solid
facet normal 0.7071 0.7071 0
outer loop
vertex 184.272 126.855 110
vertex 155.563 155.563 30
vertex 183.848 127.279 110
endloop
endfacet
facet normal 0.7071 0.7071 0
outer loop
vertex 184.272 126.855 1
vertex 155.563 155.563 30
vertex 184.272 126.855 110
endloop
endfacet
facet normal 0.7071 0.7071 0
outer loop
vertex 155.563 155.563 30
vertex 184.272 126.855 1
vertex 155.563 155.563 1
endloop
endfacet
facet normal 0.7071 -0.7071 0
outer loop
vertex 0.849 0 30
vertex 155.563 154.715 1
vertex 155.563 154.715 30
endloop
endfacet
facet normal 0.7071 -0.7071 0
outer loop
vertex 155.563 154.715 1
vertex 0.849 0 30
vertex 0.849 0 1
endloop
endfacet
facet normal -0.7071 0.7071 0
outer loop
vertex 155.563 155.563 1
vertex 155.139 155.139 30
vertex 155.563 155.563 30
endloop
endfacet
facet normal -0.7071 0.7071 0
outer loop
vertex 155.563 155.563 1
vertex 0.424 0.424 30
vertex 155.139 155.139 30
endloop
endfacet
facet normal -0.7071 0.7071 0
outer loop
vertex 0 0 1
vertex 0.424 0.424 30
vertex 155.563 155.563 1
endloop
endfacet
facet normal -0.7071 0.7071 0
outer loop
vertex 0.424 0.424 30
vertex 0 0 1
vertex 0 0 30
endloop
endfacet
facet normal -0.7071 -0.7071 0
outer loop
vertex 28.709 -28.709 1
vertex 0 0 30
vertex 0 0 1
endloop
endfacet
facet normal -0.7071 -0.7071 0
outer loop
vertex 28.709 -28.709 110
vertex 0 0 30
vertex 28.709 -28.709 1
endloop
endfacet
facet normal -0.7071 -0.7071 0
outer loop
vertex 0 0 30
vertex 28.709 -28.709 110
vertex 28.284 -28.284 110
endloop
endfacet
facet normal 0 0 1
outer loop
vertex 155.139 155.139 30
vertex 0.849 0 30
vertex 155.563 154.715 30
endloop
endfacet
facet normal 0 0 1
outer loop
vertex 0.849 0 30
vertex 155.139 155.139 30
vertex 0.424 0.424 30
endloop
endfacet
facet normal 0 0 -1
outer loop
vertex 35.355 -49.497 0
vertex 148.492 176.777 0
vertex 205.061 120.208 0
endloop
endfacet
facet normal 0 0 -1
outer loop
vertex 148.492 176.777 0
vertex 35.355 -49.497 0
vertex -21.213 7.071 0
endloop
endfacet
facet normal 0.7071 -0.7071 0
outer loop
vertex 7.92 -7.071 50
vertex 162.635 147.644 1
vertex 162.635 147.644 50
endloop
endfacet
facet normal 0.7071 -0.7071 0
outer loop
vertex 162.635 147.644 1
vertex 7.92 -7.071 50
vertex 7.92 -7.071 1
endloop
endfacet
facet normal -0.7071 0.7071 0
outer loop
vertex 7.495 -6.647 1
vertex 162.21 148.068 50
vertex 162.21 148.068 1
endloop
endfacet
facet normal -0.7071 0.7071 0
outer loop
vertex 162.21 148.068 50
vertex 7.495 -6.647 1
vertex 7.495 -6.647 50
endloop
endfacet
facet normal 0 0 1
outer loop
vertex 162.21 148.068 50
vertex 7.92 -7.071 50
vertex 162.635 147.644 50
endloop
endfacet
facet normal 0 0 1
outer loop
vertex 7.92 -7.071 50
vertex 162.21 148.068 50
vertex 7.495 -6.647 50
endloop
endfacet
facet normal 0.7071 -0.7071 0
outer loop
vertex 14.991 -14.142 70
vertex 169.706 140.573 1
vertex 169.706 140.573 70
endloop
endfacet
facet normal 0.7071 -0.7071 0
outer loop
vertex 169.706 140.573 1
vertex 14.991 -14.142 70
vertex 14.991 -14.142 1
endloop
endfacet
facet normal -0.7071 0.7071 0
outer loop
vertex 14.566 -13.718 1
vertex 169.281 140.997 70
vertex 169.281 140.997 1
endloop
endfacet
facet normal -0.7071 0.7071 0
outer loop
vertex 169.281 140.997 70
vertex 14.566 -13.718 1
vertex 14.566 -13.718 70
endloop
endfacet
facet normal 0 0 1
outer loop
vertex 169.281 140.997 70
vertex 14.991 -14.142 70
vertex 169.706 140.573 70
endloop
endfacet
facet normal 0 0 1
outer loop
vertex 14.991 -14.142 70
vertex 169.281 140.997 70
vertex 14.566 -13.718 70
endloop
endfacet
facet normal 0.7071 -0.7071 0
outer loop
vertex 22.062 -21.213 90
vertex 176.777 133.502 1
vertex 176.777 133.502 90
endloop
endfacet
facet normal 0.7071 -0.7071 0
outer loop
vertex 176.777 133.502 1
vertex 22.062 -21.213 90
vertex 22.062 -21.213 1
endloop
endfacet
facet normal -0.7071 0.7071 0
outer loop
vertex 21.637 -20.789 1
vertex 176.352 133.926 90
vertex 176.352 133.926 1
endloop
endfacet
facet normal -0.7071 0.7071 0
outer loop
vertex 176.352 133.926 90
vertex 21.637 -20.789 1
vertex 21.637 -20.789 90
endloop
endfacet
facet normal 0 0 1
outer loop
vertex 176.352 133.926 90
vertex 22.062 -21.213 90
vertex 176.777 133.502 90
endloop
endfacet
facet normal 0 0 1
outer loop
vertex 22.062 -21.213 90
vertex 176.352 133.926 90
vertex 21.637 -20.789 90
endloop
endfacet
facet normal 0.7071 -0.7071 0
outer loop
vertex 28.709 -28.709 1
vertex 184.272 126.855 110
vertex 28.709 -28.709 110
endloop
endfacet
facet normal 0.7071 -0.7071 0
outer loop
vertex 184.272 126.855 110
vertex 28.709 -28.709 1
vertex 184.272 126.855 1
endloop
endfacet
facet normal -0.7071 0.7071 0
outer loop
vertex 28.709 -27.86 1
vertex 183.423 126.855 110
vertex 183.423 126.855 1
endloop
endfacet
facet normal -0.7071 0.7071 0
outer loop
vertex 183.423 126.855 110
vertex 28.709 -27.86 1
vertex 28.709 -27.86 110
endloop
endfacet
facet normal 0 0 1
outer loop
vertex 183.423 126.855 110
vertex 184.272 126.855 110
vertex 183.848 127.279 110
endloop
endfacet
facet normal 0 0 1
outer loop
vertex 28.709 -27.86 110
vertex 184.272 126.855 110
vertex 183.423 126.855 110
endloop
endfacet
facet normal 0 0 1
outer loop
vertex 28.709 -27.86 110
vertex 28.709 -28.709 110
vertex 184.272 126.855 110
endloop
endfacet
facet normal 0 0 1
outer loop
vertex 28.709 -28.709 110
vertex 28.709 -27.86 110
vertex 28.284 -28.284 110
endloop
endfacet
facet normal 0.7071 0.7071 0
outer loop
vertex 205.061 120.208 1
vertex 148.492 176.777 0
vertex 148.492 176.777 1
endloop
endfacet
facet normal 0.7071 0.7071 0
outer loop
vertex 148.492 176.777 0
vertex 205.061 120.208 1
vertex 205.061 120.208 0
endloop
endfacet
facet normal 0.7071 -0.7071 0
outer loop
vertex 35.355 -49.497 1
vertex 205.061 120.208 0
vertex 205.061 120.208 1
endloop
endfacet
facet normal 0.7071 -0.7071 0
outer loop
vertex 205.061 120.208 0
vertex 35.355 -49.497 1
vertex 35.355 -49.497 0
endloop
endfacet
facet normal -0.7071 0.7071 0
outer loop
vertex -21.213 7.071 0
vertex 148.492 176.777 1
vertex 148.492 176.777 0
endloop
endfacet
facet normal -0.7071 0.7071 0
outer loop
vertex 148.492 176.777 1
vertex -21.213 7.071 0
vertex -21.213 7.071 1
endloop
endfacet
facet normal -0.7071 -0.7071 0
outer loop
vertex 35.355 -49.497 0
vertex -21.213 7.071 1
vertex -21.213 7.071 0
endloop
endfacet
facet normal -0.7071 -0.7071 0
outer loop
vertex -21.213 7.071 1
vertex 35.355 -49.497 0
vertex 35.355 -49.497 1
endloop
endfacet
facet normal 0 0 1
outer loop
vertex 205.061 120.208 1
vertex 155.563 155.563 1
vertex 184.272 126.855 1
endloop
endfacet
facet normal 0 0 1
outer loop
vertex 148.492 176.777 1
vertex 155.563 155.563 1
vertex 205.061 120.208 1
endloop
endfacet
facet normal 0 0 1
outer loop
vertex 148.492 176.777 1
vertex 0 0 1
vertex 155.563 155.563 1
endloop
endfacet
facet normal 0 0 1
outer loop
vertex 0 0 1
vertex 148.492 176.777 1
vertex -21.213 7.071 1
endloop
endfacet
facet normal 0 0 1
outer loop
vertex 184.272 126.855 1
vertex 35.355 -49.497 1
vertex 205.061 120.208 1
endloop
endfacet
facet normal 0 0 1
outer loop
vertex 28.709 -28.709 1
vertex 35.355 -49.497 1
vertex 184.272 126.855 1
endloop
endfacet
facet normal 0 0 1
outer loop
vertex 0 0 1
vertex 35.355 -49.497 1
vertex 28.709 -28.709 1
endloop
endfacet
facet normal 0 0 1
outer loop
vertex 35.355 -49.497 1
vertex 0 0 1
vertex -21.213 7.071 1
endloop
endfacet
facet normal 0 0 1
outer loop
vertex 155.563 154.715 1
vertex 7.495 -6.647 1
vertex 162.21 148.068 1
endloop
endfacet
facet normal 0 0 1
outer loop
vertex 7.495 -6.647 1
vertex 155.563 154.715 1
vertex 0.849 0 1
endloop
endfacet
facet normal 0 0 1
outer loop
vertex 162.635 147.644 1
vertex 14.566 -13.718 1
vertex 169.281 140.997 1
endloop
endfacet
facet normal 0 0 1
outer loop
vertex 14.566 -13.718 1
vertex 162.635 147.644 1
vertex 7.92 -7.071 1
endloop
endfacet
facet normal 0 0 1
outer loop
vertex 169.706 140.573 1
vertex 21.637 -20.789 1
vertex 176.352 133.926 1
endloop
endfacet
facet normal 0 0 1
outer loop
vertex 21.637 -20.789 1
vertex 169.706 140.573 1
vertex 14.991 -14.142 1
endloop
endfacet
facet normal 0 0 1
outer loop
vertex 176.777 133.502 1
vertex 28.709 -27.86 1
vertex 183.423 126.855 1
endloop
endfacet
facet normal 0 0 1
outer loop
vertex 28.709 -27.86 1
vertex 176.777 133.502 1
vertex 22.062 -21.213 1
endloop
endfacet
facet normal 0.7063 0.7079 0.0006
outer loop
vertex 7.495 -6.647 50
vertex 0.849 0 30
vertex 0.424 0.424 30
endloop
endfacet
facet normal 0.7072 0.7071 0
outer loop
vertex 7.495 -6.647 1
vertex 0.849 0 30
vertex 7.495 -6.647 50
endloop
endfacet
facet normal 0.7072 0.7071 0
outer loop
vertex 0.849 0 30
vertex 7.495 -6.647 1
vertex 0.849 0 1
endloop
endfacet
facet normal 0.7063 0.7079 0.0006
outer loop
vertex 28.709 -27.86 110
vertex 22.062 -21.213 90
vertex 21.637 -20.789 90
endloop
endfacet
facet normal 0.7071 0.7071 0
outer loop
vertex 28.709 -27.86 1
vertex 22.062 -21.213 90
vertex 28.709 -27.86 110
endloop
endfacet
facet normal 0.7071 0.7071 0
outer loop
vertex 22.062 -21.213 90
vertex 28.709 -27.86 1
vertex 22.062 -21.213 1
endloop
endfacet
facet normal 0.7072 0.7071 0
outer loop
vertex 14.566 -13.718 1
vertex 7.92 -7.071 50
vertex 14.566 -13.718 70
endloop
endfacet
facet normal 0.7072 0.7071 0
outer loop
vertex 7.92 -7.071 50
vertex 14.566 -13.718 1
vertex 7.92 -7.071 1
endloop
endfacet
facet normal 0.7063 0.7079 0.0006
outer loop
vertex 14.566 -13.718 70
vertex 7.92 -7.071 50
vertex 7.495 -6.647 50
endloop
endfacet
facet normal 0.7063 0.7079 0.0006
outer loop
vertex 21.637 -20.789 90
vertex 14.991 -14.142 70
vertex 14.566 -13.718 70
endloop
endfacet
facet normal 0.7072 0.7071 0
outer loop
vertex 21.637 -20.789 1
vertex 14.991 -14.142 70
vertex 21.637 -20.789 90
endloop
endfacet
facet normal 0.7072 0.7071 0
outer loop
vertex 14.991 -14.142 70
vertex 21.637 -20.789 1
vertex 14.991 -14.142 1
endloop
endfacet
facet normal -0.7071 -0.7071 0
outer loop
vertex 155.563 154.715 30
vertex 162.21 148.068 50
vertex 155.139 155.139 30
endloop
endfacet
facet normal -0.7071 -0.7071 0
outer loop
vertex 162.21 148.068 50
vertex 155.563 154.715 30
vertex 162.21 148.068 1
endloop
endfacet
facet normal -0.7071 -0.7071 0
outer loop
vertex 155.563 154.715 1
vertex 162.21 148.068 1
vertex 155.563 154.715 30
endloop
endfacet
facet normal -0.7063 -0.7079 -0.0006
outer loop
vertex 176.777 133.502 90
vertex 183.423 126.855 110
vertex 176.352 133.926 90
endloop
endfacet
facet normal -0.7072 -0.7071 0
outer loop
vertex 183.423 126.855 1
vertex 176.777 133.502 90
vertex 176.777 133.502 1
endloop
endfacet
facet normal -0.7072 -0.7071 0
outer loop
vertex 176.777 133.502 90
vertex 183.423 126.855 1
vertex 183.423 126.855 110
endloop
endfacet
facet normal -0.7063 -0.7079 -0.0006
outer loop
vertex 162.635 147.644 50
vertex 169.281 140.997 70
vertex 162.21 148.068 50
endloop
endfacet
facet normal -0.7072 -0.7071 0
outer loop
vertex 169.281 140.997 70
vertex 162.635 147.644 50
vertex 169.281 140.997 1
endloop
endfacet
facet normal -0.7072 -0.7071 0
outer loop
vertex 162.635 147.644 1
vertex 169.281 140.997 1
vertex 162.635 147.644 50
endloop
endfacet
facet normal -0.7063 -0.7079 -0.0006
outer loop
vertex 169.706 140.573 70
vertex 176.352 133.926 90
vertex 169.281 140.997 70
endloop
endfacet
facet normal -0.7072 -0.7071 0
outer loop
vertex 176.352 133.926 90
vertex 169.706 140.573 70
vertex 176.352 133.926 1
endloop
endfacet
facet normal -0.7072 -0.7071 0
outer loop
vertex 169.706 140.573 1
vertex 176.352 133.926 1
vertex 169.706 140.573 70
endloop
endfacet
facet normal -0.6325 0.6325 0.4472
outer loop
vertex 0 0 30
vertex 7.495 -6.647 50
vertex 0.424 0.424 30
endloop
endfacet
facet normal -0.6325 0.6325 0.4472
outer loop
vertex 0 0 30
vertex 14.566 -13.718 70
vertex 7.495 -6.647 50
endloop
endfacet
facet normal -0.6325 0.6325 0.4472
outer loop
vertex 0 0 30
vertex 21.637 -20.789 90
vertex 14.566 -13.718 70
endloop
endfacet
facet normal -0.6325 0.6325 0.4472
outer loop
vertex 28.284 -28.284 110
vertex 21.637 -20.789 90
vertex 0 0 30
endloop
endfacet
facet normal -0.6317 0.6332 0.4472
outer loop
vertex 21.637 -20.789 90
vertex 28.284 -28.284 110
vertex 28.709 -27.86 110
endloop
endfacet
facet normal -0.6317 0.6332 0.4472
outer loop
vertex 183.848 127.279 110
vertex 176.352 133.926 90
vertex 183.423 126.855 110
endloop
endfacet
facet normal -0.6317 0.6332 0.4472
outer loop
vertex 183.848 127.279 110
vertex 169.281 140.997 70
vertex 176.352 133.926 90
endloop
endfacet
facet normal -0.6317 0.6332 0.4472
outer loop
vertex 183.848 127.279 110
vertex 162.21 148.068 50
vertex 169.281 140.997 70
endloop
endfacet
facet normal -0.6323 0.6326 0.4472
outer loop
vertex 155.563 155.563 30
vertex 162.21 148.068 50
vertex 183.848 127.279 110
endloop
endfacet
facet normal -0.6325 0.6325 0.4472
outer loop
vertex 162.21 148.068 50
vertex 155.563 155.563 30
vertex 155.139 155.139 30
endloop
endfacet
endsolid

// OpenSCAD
w = 220;
d = 10;
nd = 5;
td = d * (nd-1);
h = 30;
th = 0.6;
sp = 20;
rotate([0,0,45]) rotate([90,0,0]) 
difference() {
    union() {
        translate([-10,0,-td/2]) cube([w+20,1.0,td * 2]);
        cube([th,h + (nd-1)*sp,(nd - 1) * d + th]);
        translate([w-th,0,0]) cube([th,h + (nd-1) * sp,(nd - 1) * d + th]);
        for (i=[0:nd-1])
            translate([0,0,d * i]) cube([w,h + i * sp,th]);
    }
    
    translate([0,h,0]) rotate([0,90,0])linear_extrude(w) polygon([ [0,0], [0,h+90], [-60,h+90]]);
        
}
